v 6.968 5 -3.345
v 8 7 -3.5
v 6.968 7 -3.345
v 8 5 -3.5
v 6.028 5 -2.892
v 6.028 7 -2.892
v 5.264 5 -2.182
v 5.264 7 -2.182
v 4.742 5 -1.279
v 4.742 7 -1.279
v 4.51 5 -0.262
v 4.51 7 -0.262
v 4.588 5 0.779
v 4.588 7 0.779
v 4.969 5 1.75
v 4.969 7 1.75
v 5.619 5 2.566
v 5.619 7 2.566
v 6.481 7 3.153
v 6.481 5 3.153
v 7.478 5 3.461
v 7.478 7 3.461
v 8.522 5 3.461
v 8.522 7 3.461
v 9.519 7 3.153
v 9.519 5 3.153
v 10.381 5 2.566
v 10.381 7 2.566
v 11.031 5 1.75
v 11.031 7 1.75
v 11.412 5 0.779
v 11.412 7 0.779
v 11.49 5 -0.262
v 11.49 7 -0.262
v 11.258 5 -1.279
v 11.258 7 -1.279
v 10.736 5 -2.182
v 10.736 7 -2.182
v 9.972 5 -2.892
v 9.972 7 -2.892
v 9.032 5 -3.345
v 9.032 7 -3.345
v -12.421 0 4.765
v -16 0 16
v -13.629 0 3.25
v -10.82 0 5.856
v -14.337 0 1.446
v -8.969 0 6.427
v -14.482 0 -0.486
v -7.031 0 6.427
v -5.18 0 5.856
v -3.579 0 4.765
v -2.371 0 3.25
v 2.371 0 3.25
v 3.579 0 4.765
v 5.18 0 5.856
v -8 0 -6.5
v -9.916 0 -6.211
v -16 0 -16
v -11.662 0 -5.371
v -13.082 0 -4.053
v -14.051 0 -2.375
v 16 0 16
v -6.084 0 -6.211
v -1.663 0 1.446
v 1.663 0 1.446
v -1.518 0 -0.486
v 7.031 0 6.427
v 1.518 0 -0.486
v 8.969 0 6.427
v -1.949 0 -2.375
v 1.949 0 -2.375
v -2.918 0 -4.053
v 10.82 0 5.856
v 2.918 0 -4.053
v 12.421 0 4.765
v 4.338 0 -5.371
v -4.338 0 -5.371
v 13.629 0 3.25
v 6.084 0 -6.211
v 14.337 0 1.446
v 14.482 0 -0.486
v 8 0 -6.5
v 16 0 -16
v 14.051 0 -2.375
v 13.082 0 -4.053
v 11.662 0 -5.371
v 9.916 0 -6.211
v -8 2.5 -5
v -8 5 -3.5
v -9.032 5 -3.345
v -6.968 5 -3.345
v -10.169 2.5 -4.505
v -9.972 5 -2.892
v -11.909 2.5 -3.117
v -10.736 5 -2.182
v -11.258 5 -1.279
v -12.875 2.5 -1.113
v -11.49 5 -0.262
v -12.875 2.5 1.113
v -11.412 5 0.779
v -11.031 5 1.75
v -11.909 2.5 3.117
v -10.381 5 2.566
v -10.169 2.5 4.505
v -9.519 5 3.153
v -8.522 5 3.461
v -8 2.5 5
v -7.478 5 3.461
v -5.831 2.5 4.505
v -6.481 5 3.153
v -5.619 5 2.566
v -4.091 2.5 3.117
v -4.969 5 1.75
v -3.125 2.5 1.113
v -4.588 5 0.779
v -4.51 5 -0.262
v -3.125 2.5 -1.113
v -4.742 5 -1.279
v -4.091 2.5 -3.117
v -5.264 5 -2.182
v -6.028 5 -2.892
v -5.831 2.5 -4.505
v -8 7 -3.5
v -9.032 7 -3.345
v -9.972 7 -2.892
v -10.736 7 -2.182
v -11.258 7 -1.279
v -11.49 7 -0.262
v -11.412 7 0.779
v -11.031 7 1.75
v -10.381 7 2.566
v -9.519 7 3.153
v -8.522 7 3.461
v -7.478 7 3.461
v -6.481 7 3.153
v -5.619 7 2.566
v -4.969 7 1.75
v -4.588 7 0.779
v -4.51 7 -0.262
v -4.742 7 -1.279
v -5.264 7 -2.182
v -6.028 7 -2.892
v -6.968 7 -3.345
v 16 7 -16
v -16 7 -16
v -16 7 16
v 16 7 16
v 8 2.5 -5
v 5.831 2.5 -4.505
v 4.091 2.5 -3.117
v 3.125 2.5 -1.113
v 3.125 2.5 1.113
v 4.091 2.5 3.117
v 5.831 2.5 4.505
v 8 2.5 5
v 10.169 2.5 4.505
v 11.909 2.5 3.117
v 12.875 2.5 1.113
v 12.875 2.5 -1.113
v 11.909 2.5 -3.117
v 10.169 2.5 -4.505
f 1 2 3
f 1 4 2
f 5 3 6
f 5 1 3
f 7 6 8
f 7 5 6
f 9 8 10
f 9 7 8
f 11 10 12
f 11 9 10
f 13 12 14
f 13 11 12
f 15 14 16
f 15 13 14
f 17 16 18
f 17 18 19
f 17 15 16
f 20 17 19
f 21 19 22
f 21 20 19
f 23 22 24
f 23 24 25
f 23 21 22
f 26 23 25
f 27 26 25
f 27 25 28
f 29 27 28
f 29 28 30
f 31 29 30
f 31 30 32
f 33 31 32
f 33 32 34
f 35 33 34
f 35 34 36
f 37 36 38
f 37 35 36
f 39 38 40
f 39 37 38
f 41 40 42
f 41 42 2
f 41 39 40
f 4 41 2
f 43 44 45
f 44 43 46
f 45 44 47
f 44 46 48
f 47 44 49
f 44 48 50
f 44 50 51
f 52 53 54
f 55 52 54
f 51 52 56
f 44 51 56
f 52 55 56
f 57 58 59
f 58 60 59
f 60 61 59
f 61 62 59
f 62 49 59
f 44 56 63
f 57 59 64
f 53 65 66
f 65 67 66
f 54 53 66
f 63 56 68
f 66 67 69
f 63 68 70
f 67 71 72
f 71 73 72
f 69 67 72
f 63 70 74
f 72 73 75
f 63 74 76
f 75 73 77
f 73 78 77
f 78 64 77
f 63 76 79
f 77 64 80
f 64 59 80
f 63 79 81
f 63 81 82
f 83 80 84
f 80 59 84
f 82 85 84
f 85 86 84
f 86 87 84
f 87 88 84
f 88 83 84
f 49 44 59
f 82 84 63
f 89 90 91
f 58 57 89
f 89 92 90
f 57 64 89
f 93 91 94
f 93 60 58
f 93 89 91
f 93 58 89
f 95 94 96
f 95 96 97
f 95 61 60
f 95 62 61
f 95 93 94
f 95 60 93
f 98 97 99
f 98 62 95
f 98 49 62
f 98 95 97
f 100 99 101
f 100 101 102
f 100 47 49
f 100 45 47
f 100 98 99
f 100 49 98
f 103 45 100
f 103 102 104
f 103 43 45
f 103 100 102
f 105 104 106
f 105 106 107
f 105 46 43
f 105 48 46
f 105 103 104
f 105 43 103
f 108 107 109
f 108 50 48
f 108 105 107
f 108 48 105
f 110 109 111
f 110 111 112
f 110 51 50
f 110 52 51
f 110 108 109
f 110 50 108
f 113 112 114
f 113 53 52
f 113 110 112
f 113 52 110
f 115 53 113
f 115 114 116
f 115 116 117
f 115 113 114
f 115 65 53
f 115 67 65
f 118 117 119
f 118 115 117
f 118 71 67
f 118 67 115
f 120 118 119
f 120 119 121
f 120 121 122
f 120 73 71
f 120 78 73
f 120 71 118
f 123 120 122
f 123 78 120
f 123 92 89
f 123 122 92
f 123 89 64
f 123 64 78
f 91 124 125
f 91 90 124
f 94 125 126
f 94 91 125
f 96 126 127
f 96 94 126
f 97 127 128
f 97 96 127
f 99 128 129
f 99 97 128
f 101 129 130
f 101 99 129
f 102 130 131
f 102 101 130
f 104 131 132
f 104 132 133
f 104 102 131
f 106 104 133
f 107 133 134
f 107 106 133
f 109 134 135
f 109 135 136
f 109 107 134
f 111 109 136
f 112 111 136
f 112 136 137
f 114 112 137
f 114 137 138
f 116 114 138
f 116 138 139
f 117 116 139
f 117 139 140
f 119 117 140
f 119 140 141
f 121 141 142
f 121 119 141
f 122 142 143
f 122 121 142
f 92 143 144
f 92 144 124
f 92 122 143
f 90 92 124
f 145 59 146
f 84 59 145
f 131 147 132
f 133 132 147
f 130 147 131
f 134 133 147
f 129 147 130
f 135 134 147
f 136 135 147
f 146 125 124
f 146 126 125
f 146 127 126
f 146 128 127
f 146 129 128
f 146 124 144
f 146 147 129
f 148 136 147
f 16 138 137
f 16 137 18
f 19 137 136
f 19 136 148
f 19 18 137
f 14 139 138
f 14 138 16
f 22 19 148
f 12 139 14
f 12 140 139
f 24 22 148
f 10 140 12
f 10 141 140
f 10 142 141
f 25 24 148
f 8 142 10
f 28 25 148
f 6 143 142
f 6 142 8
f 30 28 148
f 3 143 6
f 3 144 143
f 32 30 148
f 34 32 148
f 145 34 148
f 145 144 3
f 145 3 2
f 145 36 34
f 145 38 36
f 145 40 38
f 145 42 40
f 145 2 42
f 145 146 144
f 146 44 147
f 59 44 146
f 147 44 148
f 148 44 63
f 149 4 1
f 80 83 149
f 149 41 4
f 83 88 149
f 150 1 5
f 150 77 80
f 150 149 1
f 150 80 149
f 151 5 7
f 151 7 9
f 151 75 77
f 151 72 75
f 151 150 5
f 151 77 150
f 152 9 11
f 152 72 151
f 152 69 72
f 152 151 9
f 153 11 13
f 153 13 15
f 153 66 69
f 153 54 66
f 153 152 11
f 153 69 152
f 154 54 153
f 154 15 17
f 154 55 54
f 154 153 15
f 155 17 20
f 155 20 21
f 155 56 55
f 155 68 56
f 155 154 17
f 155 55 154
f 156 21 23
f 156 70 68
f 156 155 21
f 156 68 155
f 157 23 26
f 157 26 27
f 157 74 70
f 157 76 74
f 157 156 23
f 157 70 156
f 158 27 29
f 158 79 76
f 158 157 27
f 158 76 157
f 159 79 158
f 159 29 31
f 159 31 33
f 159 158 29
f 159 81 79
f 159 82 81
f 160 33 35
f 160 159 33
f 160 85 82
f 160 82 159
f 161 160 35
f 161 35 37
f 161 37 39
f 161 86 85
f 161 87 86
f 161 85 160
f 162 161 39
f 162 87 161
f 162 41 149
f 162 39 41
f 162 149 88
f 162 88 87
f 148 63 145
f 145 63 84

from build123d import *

# Parameters (mm, degrees)
SKETCH1_W           = 32
SKETCH1_H           = 32
BOSS_EXTRUDE1_DEPTH = 7
LPATTERN2_COUNT     = 2
LPATTERN2_PITCH     = 16


with BuildPart() as part:
    # Sketch1 → Boss-Extrude1 (new body)
    with BuildSketch(Plane(origin=(0, 0, 0), x_dir=(1, 0, 0), z_dir=(0, 1, 0))):
        Rectangle(SKETCH1_W, SKETCH1_H)
    extrude(amount=BOSS_EXTRUDE1_DEPTH)

    # Sketch3 → CSK for M1.6 Countersunk Flat Head Screw1 (revolve, cut)
    with BuildSketch(Plane(origin=(8, 0, 0), x_dir=(0, 0, -1), z_dir=(1, 0, 0))):
        Polygon((0, 0), (0, 7), (3.5, 7), (3.5, 4.999754046), (6.5, 0), align=None)
    csk_for_m1_6_countersunk_flat_head_screw = revolve(axis=Axis((8, -6.35, 0), (0, 1, 0)), mode=Mode.SUBTRACT)

    # LPattern2: CSK for M1.6 Countersunk Flat Head Screw1 ×2
    with Locations(*[(-i * LPATTERN2_PITCH, 0, 0) for i in range(1, LPATTERN2_COUNT)]):
        add(csk_for_m1_6_countersunk_flat_head_screw, mode=Mode.SUBTRACT)


solid = part.part
